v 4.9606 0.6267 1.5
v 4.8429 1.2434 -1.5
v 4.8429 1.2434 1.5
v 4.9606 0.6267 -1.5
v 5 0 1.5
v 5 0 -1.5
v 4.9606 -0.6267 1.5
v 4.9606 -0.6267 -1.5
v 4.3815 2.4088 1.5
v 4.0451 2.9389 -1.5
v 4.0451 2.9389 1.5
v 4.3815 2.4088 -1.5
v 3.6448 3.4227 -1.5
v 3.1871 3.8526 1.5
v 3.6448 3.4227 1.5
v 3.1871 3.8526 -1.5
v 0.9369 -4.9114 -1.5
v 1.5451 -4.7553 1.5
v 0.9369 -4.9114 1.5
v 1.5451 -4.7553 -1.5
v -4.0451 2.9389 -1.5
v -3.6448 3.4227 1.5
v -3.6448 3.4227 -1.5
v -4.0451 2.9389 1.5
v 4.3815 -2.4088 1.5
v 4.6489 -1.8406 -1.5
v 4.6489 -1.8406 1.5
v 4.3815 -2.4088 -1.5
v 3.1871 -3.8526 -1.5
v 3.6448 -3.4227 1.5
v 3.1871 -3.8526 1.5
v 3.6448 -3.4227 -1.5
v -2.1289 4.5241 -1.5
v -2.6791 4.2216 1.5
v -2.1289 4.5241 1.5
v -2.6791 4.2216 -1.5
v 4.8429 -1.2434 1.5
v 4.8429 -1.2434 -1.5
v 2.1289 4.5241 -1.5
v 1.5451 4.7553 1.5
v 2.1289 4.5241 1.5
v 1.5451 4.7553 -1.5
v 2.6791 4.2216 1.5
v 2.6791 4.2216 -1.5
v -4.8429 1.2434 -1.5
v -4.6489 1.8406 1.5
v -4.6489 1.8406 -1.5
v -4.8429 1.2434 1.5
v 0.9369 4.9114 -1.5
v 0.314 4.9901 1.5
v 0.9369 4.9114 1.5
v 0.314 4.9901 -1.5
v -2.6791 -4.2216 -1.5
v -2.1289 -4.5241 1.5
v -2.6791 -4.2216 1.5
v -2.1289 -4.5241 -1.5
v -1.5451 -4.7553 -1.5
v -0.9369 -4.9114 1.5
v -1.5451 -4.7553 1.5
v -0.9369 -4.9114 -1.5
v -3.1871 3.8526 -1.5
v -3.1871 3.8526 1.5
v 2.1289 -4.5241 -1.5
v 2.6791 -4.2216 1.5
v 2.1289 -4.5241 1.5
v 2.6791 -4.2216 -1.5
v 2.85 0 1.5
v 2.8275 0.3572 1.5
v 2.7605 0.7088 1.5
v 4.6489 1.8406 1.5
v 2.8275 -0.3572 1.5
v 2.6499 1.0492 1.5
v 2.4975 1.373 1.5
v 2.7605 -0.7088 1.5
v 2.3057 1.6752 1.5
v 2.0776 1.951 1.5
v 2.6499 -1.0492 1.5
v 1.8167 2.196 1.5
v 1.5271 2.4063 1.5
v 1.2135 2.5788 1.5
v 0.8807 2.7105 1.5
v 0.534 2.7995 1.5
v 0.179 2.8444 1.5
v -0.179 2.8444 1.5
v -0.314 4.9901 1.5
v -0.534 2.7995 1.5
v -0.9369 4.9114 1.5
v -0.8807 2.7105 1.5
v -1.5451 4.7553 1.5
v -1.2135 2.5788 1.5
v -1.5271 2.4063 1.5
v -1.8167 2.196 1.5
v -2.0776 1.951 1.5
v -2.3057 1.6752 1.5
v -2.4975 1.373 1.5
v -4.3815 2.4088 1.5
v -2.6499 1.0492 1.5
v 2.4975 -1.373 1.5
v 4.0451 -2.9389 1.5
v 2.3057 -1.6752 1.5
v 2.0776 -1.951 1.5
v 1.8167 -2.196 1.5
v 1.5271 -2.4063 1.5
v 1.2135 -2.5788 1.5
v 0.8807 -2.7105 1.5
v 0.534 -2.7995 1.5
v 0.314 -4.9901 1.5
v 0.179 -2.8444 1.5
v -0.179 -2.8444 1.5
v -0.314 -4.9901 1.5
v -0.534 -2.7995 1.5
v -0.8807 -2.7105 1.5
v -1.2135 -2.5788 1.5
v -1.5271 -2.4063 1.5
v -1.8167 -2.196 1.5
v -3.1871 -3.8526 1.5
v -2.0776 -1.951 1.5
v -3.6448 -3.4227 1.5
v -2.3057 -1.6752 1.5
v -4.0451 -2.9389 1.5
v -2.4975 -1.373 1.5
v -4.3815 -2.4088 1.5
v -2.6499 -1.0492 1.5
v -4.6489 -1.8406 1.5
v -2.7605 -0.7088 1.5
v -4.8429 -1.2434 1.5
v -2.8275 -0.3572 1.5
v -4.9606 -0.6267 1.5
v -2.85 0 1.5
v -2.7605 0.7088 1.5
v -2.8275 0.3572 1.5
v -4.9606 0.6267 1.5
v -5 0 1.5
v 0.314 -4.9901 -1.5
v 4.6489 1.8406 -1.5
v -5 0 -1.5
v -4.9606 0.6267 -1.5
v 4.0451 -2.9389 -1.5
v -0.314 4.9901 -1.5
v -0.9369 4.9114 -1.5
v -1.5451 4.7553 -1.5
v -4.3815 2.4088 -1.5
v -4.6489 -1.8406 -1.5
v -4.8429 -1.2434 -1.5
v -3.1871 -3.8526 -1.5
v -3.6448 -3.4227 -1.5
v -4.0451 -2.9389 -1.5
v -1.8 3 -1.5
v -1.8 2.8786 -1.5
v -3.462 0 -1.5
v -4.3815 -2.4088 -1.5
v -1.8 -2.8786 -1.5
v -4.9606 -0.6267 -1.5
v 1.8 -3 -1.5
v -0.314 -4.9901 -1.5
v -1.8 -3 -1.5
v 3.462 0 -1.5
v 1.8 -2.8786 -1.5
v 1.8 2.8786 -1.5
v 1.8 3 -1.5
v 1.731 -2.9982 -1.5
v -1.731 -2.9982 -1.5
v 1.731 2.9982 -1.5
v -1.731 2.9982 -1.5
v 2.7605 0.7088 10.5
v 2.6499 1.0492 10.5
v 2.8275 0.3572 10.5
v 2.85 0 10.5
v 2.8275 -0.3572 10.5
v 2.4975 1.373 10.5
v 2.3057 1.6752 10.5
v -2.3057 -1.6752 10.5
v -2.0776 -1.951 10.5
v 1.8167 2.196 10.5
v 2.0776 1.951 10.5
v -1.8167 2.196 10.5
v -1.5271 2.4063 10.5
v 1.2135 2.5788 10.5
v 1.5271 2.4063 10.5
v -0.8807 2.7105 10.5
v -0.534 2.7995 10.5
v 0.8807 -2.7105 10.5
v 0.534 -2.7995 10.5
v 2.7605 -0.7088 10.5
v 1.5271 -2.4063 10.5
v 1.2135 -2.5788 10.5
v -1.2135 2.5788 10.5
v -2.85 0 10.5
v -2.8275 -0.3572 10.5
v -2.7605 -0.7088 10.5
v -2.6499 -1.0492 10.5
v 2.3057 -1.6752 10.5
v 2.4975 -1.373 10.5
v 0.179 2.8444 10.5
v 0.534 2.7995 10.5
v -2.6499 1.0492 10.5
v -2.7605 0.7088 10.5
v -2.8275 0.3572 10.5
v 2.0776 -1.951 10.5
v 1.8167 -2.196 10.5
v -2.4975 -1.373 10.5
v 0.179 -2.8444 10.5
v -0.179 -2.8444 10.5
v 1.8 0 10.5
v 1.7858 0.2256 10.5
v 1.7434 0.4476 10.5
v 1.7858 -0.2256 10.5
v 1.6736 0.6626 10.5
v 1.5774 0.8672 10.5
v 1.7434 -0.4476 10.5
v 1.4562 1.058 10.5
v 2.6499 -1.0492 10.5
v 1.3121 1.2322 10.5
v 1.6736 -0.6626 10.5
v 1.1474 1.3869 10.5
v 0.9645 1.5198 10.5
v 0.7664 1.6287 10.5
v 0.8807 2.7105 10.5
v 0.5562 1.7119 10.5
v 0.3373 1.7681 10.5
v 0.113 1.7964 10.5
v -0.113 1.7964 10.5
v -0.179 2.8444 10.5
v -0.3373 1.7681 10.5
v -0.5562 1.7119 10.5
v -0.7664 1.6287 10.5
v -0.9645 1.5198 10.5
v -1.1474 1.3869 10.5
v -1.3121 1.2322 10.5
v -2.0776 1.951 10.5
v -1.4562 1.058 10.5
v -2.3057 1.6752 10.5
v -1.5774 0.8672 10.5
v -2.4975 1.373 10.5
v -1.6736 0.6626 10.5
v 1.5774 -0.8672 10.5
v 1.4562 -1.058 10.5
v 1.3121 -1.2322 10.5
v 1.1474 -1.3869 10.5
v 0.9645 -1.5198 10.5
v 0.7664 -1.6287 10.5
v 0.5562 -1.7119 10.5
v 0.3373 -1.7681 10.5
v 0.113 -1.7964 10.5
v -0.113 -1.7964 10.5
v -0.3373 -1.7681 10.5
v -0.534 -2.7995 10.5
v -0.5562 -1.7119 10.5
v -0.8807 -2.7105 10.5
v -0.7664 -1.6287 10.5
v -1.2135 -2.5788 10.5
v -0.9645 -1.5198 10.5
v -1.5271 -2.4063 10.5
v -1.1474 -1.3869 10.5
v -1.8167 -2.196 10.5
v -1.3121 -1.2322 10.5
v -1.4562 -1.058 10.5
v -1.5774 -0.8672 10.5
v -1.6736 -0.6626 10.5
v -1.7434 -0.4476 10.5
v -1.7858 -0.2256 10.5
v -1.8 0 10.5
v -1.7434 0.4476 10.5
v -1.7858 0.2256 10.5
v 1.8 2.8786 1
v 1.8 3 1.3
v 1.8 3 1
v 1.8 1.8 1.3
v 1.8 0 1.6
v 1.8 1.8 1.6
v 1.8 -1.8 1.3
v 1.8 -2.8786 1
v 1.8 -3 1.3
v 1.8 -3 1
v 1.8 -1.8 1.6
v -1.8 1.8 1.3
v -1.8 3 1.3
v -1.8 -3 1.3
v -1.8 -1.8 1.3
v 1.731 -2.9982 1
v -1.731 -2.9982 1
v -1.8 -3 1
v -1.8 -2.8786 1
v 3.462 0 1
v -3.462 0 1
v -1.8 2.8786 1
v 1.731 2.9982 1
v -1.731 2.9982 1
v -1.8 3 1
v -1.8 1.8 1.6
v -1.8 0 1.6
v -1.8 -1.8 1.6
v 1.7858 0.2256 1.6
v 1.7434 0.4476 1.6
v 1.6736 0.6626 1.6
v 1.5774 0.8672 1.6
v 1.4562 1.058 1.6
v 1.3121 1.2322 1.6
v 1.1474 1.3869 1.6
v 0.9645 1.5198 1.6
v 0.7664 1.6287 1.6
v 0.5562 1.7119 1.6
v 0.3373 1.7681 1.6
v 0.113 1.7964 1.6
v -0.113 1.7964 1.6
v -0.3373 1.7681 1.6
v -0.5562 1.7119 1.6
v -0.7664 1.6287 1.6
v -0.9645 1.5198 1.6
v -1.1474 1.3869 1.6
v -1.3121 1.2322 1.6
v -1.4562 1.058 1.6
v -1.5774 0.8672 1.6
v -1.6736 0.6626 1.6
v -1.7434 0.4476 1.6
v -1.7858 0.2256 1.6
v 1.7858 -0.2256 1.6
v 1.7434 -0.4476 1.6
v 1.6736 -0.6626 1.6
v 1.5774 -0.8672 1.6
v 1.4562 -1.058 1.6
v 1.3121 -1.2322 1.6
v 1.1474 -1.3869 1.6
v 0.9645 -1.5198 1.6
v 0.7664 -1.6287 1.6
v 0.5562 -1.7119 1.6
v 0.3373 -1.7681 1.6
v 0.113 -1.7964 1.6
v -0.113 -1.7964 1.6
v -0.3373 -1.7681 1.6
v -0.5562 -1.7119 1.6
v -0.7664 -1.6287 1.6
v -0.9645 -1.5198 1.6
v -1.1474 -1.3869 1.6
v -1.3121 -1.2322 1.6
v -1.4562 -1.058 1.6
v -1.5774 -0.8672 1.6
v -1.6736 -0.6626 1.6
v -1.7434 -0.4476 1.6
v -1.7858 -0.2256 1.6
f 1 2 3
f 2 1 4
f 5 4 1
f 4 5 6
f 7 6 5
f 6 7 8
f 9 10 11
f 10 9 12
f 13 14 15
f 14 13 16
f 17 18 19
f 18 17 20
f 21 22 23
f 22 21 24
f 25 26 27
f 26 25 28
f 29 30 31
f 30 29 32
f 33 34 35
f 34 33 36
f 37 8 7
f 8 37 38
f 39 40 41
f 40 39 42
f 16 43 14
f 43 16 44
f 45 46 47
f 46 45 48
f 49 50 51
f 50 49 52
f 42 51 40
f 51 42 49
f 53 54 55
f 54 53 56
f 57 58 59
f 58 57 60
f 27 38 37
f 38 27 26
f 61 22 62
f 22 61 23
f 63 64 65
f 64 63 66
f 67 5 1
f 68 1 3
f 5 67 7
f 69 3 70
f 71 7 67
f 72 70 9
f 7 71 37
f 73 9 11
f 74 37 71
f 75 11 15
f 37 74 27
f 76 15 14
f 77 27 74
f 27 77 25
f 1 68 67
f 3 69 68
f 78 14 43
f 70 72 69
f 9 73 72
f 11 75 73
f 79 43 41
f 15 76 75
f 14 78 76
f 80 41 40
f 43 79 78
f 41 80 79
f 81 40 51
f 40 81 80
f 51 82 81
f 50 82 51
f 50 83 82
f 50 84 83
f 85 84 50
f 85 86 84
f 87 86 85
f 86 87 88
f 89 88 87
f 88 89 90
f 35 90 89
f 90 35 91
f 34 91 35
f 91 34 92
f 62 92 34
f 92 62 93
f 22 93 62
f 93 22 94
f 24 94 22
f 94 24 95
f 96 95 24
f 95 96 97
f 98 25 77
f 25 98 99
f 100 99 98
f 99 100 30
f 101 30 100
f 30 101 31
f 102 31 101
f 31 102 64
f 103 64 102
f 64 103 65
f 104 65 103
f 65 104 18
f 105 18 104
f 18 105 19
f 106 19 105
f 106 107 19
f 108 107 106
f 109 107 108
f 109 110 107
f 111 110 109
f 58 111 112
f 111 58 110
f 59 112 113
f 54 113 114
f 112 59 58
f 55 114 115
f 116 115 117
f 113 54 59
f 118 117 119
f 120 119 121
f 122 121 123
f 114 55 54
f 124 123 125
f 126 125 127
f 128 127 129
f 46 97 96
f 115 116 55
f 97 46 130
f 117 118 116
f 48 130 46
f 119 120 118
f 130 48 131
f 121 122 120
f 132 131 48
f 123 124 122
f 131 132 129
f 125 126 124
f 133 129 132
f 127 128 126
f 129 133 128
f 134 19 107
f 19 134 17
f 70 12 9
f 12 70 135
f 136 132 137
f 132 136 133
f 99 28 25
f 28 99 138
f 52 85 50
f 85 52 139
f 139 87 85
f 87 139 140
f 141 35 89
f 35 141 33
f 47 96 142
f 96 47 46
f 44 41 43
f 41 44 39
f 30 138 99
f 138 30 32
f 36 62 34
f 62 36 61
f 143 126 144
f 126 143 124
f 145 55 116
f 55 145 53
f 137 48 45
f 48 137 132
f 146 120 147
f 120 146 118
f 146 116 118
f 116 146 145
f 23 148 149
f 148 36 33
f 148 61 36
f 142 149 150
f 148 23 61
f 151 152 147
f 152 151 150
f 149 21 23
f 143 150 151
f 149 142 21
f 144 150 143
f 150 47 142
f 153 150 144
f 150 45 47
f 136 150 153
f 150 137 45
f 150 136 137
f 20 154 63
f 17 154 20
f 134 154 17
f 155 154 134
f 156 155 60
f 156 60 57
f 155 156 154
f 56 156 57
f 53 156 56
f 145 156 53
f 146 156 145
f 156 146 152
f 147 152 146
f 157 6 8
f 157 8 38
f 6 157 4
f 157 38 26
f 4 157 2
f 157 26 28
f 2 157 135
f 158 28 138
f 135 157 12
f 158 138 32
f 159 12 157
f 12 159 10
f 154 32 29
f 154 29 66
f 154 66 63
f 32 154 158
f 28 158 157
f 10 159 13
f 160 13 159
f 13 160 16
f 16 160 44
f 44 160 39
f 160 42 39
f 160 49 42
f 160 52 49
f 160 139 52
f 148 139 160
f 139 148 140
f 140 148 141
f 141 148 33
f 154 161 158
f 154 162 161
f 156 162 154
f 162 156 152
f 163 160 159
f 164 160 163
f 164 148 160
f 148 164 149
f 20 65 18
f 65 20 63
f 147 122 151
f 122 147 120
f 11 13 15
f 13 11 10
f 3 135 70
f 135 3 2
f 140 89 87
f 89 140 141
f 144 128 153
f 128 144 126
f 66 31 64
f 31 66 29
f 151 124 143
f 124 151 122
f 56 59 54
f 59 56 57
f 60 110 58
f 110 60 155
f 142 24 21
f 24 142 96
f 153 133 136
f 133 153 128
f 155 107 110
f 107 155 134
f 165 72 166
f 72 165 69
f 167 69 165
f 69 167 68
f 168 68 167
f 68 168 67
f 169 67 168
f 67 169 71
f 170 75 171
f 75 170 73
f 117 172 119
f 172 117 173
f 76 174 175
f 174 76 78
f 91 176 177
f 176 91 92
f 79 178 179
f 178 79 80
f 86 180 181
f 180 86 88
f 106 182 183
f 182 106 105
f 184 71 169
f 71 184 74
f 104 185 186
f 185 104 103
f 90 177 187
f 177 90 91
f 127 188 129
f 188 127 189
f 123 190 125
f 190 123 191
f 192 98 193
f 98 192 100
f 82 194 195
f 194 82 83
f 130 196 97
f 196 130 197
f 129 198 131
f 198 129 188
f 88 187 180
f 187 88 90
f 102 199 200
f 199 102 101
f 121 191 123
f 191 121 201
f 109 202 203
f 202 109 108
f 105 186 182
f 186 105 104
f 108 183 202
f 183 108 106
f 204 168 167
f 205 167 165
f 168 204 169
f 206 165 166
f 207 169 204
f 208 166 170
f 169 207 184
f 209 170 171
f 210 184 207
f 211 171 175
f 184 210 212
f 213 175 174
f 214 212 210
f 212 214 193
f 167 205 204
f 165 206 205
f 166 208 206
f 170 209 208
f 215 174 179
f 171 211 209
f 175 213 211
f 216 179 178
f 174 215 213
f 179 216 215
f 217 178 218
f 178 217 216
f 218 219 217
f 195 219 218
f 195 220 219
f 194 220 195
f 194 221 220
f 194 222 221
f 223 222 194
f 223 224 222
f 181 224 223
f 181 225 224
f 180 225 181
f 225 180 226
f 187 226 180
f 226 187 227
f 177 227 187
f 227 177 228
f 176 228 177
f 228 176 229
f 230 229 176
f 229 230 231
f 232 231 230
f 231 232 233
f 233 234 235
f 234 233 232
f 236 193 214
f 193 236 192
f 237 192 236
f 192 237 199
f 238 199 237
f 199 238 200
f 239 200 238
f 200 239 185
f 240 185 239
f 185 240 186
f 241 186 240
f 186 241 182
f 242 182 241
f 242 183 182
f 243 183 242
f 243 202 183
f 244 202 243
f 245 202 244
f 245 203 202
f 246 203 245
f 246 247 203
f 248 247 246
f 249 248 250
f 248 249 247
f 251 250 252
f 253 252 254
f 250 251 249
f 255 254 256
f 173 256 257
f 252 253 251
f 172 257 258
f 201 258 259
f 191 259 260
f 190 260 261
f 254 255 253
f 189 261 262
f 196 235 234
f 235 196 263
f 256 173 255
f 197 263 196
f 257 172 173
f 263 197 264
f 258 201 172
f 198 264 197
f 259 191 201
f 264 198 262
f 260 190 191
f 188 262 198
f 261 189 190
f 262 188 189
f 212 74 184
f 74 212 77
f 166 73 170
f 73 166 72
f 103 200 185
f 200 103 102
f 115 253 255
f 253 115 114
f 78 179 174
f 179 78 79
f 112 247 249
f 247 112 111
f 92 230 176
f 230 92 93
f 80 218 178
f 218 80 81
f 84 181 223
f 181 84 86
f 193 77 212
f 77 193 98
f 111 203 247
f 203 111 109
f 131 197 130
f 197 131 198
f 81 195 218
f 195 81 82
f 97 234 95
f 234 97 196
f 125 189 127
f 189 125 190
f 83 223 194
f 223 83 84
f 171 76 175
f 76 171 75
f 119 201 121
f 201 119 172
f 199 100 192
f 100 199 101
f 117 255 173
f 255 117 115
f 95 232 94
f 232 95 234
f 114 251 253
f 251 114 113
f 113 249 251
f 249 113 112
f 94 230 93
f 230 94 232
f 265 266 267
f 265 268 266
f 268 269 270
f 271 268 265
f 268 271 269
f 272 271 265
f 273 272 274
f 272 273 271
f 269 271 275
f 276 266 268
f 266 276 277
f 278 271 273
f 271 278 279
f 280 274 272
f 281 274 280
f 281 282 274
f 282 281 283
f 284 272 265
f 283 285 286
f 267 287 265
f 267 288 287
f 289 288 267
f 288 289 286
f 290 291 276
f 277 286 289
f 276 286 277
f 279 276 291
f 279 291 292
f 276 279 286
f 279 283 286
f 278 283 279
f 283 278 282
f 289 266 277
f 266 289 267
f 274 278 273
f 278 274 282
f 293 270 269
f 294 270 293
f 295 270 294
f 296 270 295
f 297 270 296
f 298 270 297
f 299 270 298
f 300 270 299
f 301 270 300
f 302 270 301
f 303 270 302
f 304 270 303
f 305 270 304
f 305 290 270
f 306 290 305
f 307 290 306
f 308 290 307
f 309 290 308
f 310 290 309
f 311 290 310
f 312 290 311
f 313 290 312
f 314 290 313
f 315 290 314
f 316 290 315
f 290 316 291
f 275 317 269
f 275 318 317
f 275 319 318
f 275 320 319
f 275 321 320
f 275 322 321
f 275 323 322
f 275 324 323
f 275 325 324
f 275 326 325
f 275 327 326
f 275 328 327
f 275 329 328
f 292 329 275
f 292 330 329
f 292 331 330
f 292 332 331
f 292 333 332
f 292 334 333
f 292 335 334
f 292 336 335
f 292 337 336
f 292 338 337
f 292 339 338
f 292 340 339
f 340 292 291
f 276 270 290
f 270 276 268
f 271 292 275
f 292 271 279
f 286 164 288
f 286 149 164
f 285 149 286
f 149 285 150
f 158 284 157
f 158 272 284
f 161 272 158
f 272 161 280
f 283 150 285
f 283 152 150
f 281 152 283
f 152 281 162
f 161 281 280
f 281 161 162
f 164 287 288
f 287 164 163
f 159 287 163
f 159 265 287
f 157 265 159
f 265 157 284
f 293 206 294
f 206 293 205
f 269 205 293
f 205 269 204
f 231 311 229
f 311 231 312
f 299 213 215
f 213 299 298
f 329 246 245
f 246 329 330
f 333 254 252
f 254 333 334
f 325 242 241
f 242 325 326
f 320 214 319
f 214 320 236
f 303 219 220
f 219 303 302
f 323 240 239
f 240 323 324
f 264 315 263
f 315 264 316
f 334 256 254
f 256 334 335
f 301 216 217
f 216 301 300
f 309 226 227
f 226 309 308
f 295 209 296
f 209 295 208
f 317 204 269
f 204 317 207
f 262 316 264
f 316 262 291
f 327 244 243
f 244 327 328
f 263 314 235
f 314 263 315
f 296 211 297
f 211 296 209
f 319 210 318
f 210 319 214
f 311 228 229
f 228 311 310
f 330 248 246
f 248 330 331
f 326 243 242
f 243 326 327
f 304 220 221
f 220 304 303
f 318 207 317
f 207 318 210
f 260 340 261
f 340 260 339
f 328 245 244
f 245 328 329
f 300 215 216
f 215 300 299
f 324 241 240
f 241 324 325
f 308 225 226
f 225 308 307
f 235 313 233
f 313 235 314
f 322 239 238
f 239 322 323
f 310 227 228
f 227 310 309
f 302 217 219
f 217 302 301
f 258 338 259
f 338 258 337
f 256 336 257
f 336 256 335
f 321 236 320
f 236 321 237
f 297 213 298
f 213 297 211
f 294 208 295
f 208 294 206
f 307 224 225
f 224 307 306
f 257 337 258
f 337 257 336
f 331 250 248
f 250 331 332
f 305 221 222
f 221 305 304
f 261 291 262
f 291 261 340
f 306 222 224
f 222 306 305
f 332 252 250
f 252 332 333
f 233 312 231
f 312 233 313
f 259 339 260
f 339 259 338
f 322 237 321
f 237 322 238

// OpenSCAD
$fn = 50;


difference() {
	union() {
		translate(v = [0, 0, -1.5000000000]) {
			cylinder(h = 3, r = 5.0000000000);
		}
		translate(v = [0, 0, -1.5000000000]) {
			cylinder(h = 12, r = 2.8500000000);
		}
	}
	union() {
		translate(v = [0, 0, -1.5000000000]) {
			rotate(a = [0, 0, 0]) {
				difference() {
					union() {
						translate(v = [-1.8000000000, -3.0000000000, -0.3000000000]) {
							cube(size = [3.6000000000, 6.0000000000, 0.3000000000]);
						}
						translate(v = [-1.8000000000, -1.8000000000, -0.6000000000]) {
							cube(size = [3.6000000000, 3.6000000000, 0.3000000000]);
						}
						translate(v = [-1.8000000000, -3.0000000000, 2.5000000000]) {
							cube(size = [3.6000000000, 6.0000000000, 0.3000000000]);
						}
						translate(v = [-1.8000000000, -1.8000000000, 2.8000000000]) {
							cube(size = [3.6000000000, 3.6000000000, 0.3000000000]);
						}
						linear_extrude(height = 2.5000000000) {
							polygon(points = [[3.4620000000, 0.0000000000], [1.7310000000, 2.9981799479], [-1.7310000000, 2.9981799479], [-3.4620000000, 0.0000000000], [-1.7310000000, -2.9981799479], [1.7310000000, -2.9981799479]]);
						}
						translate(v = [-1.8000000000, -3.0000000000, -0.3000000000]) {
							cube(size = [3.6000000000, 6.0000000000, 0.3000000000]);
						}
						translate(v = [-1.8000000000, -1.8000000000, -0.6000000000]) {
							cube(size = [3.6000000000, 3.6000000000, 0.3000000000]);
						}
						translate(v = [-1.8000000000, -3.0000000000, 2.5000000000]) {
							cube(size = [3.6000000000, 6.0000000000, 0.3000000000]);
						}
						translate(v = [-1.8000000000, -1.8000000000, 2.8000000000]) {
							cube(size = [3.6000000000, 3.6000000000, 0.3000000000]);
						}
						translate(v = [-1.8000000000, -3.0000000000, -0.3000000000]) {
							cube(size = [3.6000000000, 6.0000000000, 0.3000000000]);
						}
						translate(v = [-1.8000000000, -1.8000000000, -0.6000000000]) {
							cube(size = [3.6000000000, 3.6000000000, 0.3000000000]);
						}
						translate(v = [-1.8000000000, -3.0000000000, 2.5000000000]) {
							cube(size = [3.6000000000, 6.0000000000, 0.3000000000]);
						}
						translate(v = [-1.8000000000, -1.8000000000, 2.8000000000]) {
							cube(size = [3.6000000000, 3.6000000000, 0.3000000000]);
						}
					}
					union();
				}
			}
		}
		translate(v = [0, 0, -50.0000000000]) {
			cylinder(h = 100, r = 1.8000000000);
		}
	}
}
